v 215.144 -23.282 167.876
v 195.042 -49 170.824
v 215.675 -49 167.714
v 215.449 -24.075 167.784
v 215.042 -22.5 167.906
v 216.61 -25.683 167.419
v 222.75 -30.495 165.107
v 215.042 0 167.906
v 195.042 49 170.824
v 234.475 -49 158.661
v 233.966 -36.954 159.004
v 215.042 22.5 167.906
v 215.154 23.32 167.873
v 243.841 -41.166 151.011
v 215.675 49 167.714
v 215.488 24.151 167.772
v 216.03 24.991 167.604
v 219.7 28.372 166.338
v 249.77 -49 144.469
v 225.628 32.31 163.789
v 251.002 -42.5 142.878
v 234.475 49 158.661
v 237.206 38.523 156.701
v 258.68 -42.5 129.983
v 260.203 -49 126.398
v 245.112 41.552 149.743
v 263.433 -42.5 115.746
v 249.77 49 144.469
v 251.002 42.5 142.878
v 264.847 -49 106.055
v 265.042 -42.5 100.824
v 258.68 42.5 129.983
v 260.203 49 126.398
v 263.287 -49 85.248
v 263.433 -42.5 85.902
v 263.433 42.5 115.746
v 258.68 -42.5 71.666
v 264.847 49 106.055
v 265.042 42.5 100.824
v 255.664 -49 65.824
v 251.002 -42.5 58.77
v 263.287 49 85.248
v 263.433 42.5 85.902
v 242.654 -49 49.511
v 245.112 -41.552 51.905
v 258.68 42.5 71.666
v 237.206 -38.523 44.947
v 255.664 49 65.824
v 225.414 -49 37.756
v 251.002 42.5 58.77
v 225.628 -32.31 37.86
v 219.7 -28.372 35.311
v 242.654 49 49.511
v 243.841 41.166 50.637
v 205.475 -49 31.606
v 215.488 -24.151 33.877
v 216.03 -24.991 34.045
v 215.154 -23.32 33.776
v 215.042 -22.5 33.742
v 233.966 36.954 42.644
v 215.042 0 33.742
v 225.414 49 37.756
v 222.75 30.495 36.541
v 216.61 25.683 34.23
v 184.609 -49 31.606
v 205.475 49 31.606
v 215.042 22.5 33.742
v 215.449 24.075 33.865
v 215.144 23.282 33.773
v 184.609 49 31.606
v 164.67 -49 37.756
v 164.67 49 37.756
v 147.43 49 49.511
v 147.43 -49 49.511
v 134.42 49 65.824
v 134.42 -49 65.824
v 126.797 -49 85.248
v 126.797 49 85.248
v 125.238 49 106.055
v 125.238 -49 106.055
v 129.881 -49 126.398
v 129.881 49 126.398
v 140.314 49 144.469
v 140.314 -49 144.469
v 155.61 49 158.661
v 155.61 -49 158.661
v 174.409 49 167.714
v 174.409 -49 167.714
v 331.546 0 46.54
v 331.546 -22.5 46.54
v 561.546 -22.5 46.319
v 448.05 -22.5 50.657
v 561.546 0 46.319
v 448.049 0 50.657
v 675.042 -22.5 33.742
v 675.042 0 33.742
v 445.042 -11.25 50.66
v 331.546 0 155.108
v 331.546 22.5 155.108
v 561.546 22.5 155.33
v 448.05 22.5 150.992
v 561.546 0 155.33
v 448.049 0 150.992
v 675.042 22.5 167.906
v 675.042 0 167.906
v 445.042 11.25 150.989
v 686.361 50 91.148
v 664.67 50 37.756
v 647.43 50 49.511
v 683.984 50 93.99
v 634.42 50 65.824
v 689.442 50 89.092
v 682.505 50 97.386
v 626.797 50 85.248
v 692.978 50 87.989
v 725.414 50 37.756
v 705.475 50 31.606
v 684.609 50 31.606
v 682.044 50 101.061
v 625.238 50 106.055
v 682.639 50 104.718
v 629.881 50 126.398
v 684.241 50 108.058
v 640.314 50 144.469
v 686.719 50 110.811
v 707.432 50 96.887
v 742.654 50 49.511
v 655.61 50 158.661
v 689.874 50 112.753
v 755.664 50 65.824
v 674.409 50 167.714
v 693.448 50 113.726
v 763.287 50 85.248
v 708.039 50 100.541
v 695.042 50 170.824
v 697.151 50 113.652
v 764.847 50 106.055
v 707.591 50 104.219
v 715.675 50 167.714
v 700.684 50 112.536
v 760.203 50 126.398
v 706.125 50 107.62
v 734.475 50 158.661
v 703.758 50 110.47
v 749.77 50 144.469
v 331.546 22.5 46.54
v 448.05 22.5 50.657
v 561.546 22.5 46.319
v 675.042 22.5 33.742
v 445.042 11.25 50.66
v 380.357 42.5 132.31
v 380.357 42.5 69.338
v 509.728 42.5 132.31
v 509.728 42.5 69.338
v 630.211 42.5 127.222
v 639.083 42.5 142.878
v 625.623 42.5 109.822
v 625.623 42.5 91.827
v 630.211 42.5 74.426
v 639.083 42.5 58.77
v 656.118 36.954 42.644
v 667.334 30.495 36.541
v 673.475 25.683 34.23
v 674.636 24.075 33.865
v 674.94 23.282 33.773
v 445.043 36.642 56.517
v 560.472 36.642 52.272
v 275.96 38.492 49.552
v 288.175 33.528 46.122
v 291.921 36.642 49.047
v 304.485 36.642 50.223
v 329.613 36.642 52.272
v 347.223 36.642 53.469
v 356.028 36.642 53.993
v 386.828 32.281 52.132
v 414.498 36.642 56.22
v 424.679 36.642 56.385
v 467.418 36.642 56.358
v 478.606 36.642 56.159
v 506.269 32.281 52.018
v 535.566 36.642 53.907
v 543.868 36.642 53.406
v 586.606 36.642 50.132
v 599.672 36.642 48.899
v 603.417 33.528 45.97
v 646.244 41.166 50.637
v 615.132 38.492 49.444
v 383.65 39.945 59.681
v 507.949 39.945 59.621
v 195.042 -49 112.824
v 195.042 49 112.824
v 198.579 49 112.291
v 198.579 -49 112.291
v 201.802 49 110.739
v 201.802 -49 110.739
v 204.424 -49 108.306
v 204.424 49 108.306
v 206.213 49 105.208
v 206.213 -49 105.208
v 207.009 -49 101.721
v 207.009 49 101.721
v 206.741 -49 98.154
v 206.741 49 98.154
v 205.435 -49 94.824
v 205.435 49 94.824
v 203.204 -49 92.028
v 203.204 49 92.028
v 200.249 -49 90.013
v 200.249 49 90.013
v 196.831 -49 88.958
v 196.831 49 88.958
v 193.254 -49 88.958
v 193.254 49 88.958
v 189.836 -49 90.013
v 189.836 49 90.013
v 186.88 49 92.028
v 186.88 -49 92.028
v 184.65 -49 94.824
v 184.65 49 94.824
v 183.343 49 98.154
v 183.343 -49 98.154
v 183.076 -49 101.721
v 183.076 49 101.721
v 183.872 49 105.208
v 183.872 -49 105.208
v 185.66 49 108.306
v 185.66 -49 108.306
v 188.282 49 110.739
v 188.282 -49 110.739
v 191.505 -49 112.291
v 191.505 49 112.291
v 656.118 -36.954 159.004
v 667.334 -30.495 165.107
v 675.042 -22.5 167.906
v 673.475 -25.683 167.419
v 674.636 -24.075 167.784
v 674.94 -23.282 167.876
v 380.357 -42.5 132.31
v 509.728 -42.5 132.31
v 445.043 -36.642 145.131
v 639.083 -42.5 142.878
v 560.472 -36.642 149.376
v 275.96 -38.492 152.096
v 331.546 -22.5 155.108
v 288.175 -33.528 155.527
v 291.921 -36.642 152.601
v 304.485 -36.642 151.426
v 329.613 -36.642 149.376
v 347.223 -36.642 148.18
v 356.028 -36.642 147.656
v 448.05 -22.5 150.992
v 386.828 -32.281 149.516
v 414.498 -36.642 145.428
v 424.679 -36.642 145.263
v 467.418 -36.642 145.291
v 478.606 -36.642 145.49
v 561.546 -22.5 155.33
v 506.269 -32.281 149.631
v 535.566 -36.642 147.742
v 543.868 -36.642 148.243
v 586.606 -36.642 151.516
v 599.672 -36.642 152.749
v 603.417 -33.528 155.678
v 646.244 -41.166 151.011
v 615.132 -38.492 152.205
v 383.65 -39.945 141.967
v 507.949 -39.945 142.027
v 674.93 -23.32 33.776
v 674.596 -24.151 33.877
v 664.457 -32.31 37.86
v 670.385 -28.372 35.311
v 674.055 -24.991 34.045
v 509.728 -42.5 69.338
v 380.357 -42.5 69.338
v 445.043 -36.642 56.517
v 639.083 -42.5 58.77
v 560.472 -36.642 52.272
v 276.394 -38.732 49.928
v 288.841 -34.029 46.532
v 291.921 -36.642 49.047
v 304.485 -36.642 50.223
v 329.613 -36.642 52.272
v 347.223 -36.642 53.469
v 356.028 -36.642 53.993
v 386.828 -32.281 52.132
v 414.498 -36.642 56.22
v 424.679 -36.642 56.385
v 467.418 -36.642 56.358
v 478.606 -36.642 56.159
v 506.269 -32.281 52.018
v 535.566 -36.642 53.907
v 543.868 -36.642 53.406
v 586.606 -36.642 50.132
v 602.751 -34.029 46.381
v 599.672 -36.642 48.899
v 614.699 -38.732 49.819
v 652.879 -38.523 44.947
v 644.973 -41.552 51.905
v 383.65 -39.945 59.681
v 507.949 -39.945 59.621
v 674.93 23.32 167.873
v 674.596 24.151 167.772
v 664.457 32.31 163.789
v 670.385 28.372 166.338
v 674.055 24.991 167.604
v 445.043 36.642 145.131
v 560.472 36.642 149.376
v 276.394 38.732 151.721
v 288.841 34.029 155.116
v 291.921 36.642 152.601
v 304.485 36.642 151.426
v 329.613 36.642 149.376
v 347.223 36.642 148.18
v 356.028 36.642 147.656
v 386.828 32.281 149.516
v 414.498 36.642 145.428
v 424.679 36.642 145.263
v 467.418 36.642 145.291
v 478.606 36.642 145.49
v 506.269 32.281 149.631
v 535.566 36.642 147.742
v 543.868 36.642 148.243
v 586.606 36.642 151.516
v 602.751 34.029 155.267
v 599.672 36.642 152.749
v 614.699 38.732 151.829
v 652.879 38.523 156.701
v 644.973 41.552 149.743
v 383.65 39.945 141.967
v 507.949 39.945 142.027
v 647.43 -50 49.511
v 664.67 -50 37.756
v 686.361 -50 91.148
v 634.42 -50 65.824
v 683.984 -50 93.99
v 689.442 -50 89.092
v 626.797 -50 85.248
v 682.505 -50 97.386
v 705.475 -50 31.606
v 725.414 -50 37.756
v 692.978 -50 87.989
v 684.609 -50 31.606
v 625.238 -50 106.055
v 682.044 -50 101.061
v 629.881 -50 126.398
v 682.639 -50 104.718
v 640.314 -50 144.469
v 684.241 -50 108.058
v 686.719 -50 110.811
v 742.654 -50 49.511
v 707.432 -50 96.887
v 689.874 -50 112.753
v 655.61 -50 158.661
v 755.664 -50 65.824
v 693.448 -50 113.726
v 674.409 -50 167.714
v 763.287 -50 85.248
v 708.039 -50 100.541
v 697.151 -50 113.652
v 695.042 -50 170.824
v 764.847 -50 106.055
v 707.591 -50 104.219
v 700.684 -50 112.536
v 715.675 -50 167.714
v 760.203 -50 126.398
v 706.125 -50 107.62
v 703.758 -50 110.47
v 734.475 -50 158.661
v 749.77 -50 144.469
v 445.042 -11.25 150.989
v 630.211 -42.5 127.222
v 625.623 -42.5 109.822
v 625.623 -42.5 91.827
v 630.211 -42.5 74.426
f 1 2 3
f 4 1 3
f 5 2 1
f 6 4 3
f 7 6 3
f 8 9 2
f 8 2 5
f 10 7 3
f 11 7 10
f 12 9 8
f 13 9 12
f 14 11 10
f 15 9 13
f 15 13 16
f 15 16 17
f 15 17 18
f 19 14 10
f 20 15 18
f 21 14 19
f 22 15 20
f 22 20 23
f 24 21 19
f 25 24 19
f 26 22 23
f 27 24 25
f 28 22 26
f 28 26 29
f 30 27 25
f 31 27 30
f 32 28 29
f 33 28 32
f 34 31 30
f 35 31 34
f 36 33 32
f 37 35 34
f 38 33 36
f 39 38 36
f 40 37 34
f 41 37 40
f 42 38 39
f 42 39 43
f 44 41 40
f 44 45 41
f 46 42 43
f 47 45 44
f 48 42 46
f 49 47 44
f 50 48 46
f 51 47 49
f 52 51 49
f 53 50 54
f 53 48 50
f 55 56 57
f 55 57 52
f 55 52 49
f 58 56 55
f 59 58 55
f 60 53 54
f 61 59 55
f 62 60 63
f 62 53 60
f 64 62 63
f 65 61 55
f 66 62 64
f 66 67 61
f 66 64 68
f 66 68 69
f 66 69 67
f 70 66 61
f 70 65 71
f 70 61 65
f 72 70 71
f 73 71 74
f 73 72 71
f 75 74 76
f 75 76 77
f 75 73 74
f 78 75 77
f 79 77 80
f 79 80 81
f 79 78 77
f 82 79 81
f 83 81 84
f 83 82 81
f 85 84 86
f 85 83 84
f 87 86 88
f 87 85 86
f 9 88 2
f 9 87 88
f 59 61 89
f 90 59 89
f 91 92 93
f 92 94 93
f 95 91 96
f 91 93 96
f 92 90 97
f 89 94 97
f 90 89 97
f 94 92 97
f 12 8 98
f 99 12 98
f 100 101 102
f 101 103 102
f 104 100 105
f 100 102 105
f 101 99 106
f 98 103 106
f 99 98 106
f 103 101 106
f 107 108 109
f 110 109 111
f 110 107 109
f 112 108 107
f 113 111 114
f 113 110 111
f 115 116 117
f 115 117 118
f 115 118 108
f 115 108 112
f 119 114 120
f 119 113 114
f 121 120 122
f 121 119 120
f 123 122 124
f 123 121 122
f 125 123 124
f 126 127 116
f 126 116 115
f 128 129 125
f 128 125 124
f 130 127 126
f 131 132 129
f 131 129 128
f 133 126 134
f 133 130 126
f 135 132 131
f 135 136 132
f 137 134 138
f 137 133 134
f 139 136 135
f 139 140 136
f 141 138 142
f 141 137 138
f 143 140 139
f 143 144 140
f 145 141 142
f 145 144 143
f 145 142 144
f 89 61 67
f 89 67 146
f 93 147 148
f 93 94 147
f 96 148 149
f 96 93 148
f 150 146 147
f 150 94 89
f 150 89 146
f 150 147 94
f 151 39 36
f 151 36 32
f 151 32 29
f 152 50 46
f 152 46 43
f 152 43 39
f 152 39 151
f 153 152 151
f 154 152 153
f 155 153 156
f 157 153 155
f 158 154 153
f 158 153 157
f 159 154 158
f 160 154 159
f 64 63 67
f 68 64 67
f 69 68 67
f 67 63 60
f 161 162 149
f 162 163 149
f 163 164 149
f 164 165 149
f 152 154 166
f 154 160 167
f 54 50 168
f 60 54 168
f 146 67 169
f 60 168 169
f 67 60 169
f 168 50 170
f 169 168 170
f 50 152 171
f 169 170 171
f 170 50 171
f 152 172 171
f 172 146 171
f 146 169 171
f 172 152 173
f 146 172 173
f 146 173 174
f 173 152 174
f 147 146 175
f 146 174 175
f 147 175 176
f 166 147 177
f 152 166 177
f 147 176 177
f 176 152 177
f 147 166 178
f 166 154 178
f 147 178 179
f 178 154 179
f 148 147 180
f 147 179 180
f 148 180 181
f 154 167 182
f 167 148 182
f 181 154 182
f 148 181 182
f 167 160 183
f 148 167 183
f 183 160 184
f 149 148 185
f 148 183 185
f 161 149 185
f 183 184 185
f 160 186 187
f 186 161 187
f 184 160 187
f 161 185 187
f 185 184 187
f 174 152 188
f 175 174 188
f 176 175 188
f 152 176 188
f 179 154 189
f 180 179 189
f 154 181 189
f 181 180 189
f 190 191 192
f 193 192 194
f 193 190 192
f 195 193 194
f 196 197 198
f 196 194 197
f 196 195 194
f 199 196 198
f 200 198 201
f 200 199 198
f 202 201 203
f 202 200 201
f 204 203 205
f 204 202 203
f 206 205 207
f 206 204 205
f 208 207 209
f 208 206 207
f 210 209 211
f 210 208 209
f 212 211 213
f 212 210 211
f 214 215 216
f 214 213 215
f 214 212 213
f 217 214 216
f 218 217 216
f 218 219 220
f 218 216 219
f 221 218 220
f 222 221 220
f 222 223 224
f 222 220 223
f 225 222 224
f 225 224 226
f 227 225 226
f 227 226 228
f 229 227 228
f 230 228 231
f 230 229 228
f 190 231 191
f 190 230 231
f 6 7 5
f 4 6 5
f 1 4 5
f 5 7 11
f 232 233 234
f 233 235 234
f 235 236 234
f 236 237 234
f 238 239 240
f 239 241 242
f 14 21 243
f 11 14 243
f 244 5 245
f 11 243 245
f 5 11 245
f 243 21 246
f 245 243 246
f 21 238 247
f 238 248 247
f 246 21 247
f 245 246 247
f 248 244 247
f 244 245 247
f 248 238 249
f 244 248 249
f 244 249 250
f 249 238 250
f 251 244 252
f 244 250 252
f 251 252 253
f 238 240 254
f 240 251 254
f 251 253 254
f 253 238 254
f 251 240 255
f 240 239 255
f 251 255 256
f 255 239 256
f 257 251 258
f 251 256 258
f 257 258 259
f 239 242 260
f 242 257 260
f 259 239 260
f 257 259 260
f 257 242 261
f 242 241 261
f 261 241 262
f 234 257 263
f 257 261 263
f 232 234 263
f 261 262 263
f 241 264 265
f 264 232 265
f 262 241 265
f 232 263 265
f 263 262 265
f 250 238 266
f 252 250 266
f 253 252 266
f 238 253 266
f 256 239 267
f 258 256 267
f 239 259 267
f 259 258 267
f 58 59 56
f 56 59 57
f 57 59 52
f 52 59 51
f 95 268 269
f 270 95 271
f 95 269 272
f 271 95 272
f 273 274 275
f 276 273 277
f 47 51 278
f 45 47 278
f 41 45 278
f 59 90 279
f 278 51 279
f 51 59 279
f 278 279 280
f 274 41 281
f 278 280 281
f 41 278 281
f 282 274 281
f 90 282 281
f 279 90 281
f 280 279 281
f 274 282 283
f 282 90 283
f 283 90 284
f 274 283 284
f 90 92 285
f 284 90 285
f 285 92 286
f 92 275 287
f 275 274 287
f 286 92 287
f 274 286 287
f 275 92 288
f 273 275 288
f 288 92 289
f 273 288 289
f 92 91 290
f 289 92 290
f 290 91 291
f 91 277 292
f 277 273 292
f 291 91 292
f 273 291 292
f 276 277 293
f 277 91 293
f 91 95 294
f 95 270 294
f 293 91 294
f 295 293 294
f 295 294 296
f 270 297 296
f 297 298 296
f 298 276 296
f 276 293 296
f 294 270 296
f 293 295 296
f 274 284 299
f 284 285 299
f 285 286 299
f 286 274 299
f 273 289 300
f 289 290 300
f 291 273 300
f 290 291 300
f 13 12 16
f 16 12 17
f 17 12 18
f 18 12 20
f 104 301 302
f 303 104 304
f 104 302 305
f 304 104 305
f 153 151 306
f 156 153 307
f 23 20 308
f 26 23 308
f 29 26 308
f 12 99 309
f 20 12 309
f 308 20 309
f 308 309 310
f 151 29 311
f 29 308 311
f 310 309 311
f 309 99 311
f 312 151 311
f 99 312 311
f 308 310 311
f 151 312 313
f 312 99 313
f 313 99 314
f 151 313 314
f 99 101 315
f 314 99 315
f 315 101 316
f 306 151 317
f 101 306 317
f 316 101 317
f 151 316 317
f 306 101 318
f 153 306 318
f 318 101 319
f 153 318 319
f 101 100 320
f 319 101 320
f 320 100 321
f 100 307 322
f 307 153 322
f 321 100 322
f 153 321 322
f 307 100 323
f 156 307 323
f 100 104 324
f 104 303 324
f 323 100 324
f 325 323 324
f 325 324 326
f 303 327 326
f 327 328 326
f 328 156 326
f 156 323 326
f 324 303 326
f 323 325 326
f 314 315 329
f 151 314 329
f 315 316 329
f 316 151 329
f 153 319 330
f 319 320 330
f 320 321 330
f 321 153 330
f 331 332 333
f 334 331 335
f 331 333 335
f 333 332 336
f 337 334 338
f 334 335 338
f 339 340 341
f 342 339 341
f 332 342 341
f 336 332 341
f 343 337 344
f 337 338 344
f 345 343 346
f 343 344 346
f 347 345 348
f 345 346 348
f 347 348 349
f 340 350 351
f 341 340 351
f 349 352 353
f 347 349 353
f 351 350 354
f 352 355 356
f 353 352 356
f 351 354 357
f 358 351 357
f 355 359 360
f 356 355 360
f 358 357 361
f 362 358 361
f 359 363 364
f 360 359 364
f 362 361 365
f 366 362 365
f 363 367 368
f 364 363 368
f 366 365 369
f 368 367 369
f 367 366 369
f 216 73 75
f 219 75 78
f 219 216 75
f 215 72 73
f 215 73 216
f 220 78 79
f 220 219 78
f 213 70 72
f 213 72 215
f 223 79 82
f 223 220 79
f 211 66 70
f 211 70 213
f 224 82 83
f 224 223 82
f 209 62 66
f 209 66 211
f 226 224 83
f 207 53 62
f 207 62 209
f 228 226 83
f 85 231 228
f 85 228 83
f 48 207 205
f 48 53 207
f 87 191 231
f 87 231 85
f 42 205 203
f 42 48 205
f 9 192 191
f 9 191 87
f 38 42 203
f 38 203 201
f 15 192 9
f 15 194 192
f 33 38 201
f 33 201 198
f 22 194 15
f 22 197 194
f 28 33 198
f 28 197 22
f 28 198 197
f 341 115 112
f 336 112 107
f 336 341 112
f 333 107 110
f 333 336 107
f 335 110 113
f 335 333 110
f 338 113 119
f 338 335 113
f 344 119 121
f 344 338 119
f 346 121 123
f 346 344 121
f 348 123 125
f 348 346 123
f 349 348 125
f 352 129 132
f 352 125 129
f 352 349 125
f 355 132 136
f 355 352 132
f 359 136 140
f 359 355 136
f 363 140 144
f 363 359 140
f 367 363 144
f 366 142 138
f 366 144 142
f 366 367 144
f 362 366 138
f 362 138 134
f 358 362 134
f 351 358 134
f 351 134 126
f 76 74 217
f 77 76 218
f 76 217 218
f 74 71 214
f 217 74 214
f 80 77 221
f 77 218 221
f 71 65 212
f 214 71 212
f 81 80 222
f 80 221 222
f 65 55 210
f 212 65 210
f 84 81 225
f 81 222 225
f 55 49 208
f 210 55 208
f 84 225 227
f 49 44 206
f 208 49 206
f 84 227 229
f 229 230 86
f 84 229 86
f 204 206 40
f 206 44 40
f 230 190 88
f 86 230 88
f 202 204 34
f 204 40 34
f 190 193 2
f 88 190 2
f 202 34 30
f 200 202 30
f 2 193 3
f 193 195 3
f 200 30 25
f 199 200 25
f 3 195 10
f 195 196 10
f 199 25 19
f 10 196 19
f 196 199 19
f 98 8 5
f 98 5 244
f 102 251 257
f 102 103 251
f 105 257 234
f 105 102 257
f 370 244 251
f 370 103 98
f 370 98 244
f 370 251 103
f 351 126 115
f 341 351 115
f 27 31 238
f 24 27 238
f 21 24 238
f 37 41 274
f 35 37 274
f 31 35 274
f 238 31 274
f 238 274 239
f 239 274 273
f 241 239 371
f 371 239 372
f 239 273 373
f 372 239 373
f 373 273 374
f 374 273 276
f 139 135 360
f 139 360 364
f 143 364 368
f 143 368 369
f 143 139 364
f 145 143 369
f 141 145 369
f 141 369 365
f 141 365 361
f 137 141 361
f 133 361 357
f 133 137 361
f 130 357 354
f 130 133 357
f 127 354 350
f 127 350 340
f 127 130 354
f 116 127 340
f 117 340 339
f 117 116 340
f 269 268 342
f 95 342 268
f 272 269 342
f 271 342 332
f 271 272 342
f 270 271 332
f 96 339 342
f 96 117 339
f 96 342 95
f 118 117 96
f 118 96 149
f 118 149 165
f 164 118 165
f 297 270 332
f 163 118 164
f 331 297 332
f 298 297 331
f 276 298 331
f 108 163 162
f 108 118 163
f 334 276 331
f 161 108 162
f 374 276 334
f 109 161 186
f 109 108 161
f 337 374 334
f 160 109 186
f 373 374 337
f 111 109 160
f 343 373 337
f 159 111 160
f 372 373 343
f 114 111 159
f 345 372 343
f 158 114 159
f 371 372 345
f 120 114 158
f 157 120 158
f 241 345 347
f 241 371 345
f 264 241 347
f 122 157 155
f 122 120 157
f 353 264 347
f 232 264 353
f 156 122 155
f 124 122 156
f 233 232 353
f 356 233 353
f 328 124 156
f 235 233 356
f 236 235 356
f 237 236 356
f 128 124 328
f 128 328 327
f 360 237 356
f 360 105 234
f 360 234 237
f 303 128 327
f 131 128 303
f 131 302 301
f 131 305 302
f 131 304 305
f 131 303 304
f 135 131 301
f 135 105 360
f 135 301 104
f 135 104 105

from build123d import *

# Parameters (mm, degrees)
BOSS_EXTRUDE3_DEPTH  = 42.5
SKETCH5_3_R          = 70
BOSS_EXTRUDE4_DEPTH  = 49
SKETCH5_6_R          = 70
BOSS_EXTRUDE11_DEPTH = 50
FILLET5_R            = 20
SKETCH6_R            = 12
CUT_EXTRUDE1_DEPTH   = 112
CUT_EXTRUDE2_DEPTH   = 151


with BuildPart() as part:
    # Sketch5 → Boss-Extrude3 (new, symmetric)
    with BuildSketch(Plane(origin=(0, 0, 0), x_dir=(1, 0, 0), z_dir=(0, 1, 0))):
        with BuildLine():
            ThreePointArc((215.042236358, -33.742230992), (251.167097159, -58.991268991), (265.042236358, -100.824270317))
            ThreePointArc((265.042236358, -100.824270317), (251.167097159, -142.657271644), (215.042236358, -167.906309642))
            add(Edge.make_bspline(
                [(215.042236358, -167.906309642), (445.042236358, -134.071536156), (675.042236358, -167.906309642)],
                knots=[0, 0, 0, 1, 1, 1], degree=2))
            ThreePointArc((675.042236358, -167.906309642), (625.042236358, -100.824270317), (675.042236358, -33.742230992))
            add(Edge.make_bspline(
                [(215.042236358, -33.742230992), (445.042236358, -67.577004479), (675.042236358, -33.742230992)],
                knots=[0, 0, 0, 1, 1, 1], degree=2))
        make_face()
    extrude(amount=BOSS_EXTRUDE3_DEPTH, both=True)

    # Sketch5<3> → Boss-Extrude4 (add, symmetric)
    with BuildSketch(Plane(origin=(0, 0, 0), x_dir=(1, 0, 0), z_dir=(0, 1, 0))):
        with Locations(Location((195.042236358, -100.824270317, 0), (0, 0, 270))):
            Circle(SKETCH5_3_R)
    extrude(amount=BOSS_EXTRUDE4_DEPTH, both=True)

    # Sketch5<6> → Boss-Extrude11 (add, symmetric)
    with BuildSketch(Plane(origin=(0, 0, 0), x_dir=(1, 0, 0), z_dir=(0, 1, 0))):
        with Locations(Location((695.042236358, -100.824270317, 0), (0, 0, 270))):
            Circle(SKETCH5_6_R)
    extrude(amount=BOSS_EXTRUDE11_DEPTH, both=True)

    # Fillet5
    fillet5_edges = [part.edges().sort_by_distance(p)[0] for p in [
        (445.042236357, 42.5, 150.988922899),
        (445.042236357, 42.5, 50.659617736),
        (445.042236357, -42.5, 150.988922899),
        (445.042236357, -42.5, 50.659617736),
    ]]
    fillet(fillet5_edges, radius=FILLET5_R)

    # Sketch6 → Cut-Extrude1 (cut)
    with BuildSketch(Plane(origin=(0, -50, 0), x_dir=(1, 0, 0), z_dir=(0, 1, 0))):
        with Locations(Location((195.042236357, -100.824270318, 0), (0, 0, 270))):
            Circle(SKETCH6_R)
    extrude(amount=CUT_EXTRUDE1_DEPTH, mode=Mode.SUBTRACT)

    # Sketch10 → Cut-Extrude2 (cut)
    with BuildSketch(Plane.XZ.offset(50)):
        with BuildLine():
            Line((707.431750575, 96.887274325), (692.978208818, 87.989170384))
            ThreePointArc((692.978208818, 87.989170384), (688.226960704, 111.894591803), (707.431750575, 96.887274325))
        make_face()
    extrude(amount=-CUT_EXTRUDE2_DEPTH, mode=Mode.SUBTRACT)


solid = part.part
